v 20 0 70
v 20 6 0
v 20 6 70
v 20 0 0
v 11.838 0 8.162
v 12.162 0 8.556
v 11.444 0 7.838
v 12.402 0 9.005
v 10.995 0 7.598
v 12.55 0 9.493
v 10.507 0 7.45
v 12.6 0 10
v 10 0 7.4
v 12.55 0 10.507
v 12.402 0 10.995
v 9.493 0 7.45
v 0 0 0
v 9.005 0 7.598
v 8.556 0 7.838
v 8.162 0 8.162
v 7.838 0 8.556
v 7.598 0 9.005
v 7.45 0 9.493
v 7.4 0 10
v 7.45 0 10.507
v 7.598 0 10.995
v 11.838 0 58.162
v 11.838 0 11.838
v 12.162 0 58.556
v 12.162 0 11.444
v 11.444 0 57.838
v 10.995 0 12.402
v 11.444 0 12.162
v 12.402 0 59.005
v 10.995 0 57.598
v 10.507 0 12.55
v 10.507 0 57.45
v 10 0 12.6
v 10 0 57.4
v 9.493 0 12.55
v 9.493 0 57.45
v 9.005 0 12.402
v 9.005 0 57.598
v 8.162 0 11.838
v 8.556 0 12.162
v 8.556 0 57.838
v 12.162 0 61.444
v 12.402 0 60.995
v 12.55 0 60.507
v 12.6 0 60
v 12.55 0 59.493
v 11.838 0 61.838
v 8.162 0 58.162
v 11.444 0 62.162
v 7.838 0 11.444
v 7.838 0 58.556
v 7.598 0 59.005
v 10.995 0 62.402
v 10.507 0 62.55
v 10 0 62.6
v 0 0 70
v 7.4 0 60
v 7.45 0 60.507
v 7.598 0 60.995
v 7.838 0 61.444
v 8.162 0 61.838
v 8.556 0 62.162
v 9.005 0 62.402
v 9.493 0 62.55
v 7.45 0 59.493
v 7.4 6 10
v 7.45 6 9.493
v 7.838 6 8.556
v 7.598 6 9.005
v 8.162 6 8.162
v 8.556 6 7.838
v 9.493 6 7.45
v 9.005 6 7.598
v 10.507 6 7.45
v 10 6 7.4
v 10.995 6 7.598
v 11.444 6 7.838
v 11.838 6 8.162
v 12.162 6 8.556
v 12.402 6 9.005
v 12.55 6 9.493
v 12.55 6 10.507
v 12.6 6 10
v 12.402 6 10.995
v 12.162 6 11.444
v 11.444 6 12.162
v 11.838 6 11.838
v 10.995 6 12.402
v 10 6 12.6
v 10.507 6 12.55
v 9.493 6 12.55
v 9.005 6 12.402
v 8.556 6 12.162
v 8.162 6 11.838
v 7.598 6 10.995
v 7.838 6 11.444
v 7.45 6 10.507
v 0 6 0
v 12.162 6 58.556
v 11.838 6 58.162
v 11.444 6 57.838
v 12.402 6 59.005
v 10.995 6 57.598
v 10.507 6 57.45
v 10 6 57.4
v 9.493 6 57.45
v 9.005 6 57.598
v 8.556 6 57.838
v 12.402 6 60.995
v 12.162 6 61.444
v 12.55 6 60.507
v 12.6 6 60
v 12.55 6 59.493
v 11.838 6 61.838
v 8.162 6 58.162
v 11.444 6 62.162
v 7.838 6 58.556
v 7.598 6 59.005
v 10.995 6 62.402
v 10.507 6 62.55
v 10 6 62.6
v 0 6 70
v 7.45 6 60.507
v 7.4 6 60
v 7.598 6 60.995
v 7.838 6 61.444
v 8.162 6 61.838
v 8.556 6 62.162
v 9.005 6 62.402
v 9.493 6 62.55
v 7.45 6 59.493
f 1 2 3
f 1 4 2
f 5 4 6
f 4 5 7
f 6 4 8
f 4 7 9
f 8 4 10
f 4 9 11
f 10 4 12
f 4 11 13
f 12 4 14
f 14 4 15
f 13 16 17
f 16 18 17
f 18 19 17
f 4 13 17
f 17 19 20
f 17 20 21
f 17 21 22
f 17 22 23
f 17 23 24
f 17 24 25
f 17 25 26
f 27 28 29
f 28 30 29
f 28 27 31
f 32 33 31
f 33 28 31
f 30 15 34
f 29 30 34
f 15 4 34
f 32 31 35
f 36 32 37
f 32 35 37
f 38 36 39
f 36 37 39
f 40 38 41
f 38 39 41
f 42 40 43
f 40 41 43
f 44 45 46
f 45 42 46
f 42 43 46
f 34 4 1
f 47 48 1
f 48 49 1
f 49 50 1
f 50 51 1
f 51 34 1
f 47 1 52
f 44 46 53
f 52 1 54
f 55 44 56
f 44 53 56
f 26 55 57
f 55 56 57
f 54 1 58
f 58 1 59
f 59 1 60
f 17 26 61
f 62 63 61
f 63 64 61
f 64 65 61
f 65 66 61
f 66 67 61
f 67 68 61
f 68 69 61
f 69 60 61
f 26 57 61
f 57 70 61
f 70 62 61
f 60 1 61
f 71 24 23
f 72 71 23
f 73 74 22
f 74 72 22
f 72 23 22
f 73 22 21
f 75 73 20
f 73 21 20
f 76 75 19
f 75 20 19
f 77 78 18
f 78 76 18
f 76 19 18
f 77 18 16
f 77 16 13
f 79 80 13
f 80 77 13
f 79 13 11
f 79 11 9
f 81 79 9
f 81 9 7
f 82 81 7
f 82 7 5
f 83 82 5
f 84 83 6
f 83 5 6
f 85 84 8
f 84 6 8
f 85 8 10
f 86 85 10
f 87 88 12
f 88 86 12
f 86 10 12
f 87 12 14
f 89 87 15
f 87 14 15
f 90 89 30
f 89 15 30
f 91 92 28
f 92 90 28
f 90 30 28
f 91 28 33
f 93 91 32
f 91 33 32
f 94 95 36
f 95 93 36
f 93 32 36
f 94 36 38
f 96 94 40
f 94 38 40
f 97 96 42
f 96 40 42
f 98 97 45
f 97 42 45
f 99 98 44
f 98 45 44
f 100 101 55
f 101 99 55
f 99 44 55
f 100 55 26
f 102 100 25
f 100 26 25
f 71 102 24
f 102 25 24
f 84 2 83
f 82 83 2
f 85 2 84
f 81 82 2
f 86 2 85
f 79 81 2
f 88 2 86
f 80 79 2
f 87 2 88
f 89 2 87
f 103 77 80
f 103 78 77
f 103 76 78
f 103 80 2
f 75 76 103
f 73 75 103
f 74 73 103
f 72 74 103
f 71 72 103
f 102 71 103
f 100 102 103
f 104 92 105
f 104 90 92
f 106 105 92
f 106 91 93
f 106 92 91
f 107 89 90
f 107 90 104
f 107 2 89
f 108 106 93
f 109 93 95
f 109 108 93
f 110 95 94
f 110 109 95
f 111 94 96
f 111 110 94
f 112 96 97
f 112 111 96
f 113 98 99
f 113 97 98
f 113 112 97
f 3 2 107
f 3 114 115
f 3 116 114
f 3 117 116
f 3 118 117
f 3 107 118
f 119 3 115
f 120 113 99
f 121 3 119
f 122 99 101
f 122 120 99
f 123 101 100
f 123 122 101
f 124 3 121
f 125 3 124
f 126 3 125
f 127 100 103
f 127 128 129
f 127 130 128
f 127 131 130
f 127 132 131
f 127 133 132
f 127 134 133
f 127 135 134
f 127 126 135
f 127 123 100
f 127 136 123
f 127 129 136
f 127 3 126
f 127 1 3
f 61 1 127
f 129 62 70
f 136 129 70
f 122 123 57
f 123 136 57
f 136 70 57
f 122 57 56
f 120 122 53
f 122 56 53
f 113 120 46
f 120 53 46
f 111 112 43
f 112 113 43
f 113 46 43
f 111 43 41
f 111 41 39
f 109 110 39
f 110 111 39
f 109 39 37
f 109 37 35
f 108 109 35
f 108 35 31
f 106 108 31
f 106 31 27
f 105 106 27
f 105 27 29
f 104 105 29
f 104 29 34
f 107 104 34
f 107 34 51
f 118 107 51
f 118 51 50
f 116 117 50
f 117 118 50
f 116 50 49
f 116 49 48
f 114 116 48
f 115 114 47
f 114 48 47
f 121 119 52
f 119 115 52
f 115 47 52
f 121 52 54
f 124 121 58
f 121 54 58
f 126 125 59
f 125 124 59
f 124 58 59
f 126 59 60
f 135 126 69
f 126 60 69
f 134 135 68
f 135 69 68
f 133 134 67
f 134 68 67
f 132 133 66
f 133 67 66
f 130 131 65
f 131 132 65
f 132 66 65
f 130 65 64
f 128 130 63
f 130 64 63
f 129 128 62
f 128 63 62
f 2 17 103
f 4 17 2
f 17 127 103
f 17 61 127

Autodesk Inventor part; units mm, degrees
ref_plane "YZ Plane" through (0, 0, 0) normal (1, 0, 0) x (0, 1, 0)
ref_plane "XZ Plane" through (0, 0, 0) normal (0, 1, 0) x (-1, 0, 0)
ref_plane "XY Plane" through (0, 0, 0) normal (0, 0, 1) x (1, 0, 0)
sketch "Sketch2" plane through (0, 0, 0) normal (0, 1, 0) x (-1, 0, 0)
  line L0 (0, 0) -> (-20, 0)
  line L1 (-20, 0) -> (-20, 70)
  line L2 (-20, 70) -> (0, 70)
  line L3 (0, 70) -> (0, 0)
  circle A0 centre (-10, 10) radius 2.6
  circle A1 centre (-10, 60) radius 2.6
  dimension "d76" = 20
  dimension "d78" = 10
  dimension "d79" = 50
  dimension "d80" = 10
  dimension "d81" = 5.2
  dimension "d82" = 10
extrude "Extrusion2" add sketch "Sketch2" along normal blind 6
properties part number "phone_holder_top_cap" material "Acrylic, Clear"
